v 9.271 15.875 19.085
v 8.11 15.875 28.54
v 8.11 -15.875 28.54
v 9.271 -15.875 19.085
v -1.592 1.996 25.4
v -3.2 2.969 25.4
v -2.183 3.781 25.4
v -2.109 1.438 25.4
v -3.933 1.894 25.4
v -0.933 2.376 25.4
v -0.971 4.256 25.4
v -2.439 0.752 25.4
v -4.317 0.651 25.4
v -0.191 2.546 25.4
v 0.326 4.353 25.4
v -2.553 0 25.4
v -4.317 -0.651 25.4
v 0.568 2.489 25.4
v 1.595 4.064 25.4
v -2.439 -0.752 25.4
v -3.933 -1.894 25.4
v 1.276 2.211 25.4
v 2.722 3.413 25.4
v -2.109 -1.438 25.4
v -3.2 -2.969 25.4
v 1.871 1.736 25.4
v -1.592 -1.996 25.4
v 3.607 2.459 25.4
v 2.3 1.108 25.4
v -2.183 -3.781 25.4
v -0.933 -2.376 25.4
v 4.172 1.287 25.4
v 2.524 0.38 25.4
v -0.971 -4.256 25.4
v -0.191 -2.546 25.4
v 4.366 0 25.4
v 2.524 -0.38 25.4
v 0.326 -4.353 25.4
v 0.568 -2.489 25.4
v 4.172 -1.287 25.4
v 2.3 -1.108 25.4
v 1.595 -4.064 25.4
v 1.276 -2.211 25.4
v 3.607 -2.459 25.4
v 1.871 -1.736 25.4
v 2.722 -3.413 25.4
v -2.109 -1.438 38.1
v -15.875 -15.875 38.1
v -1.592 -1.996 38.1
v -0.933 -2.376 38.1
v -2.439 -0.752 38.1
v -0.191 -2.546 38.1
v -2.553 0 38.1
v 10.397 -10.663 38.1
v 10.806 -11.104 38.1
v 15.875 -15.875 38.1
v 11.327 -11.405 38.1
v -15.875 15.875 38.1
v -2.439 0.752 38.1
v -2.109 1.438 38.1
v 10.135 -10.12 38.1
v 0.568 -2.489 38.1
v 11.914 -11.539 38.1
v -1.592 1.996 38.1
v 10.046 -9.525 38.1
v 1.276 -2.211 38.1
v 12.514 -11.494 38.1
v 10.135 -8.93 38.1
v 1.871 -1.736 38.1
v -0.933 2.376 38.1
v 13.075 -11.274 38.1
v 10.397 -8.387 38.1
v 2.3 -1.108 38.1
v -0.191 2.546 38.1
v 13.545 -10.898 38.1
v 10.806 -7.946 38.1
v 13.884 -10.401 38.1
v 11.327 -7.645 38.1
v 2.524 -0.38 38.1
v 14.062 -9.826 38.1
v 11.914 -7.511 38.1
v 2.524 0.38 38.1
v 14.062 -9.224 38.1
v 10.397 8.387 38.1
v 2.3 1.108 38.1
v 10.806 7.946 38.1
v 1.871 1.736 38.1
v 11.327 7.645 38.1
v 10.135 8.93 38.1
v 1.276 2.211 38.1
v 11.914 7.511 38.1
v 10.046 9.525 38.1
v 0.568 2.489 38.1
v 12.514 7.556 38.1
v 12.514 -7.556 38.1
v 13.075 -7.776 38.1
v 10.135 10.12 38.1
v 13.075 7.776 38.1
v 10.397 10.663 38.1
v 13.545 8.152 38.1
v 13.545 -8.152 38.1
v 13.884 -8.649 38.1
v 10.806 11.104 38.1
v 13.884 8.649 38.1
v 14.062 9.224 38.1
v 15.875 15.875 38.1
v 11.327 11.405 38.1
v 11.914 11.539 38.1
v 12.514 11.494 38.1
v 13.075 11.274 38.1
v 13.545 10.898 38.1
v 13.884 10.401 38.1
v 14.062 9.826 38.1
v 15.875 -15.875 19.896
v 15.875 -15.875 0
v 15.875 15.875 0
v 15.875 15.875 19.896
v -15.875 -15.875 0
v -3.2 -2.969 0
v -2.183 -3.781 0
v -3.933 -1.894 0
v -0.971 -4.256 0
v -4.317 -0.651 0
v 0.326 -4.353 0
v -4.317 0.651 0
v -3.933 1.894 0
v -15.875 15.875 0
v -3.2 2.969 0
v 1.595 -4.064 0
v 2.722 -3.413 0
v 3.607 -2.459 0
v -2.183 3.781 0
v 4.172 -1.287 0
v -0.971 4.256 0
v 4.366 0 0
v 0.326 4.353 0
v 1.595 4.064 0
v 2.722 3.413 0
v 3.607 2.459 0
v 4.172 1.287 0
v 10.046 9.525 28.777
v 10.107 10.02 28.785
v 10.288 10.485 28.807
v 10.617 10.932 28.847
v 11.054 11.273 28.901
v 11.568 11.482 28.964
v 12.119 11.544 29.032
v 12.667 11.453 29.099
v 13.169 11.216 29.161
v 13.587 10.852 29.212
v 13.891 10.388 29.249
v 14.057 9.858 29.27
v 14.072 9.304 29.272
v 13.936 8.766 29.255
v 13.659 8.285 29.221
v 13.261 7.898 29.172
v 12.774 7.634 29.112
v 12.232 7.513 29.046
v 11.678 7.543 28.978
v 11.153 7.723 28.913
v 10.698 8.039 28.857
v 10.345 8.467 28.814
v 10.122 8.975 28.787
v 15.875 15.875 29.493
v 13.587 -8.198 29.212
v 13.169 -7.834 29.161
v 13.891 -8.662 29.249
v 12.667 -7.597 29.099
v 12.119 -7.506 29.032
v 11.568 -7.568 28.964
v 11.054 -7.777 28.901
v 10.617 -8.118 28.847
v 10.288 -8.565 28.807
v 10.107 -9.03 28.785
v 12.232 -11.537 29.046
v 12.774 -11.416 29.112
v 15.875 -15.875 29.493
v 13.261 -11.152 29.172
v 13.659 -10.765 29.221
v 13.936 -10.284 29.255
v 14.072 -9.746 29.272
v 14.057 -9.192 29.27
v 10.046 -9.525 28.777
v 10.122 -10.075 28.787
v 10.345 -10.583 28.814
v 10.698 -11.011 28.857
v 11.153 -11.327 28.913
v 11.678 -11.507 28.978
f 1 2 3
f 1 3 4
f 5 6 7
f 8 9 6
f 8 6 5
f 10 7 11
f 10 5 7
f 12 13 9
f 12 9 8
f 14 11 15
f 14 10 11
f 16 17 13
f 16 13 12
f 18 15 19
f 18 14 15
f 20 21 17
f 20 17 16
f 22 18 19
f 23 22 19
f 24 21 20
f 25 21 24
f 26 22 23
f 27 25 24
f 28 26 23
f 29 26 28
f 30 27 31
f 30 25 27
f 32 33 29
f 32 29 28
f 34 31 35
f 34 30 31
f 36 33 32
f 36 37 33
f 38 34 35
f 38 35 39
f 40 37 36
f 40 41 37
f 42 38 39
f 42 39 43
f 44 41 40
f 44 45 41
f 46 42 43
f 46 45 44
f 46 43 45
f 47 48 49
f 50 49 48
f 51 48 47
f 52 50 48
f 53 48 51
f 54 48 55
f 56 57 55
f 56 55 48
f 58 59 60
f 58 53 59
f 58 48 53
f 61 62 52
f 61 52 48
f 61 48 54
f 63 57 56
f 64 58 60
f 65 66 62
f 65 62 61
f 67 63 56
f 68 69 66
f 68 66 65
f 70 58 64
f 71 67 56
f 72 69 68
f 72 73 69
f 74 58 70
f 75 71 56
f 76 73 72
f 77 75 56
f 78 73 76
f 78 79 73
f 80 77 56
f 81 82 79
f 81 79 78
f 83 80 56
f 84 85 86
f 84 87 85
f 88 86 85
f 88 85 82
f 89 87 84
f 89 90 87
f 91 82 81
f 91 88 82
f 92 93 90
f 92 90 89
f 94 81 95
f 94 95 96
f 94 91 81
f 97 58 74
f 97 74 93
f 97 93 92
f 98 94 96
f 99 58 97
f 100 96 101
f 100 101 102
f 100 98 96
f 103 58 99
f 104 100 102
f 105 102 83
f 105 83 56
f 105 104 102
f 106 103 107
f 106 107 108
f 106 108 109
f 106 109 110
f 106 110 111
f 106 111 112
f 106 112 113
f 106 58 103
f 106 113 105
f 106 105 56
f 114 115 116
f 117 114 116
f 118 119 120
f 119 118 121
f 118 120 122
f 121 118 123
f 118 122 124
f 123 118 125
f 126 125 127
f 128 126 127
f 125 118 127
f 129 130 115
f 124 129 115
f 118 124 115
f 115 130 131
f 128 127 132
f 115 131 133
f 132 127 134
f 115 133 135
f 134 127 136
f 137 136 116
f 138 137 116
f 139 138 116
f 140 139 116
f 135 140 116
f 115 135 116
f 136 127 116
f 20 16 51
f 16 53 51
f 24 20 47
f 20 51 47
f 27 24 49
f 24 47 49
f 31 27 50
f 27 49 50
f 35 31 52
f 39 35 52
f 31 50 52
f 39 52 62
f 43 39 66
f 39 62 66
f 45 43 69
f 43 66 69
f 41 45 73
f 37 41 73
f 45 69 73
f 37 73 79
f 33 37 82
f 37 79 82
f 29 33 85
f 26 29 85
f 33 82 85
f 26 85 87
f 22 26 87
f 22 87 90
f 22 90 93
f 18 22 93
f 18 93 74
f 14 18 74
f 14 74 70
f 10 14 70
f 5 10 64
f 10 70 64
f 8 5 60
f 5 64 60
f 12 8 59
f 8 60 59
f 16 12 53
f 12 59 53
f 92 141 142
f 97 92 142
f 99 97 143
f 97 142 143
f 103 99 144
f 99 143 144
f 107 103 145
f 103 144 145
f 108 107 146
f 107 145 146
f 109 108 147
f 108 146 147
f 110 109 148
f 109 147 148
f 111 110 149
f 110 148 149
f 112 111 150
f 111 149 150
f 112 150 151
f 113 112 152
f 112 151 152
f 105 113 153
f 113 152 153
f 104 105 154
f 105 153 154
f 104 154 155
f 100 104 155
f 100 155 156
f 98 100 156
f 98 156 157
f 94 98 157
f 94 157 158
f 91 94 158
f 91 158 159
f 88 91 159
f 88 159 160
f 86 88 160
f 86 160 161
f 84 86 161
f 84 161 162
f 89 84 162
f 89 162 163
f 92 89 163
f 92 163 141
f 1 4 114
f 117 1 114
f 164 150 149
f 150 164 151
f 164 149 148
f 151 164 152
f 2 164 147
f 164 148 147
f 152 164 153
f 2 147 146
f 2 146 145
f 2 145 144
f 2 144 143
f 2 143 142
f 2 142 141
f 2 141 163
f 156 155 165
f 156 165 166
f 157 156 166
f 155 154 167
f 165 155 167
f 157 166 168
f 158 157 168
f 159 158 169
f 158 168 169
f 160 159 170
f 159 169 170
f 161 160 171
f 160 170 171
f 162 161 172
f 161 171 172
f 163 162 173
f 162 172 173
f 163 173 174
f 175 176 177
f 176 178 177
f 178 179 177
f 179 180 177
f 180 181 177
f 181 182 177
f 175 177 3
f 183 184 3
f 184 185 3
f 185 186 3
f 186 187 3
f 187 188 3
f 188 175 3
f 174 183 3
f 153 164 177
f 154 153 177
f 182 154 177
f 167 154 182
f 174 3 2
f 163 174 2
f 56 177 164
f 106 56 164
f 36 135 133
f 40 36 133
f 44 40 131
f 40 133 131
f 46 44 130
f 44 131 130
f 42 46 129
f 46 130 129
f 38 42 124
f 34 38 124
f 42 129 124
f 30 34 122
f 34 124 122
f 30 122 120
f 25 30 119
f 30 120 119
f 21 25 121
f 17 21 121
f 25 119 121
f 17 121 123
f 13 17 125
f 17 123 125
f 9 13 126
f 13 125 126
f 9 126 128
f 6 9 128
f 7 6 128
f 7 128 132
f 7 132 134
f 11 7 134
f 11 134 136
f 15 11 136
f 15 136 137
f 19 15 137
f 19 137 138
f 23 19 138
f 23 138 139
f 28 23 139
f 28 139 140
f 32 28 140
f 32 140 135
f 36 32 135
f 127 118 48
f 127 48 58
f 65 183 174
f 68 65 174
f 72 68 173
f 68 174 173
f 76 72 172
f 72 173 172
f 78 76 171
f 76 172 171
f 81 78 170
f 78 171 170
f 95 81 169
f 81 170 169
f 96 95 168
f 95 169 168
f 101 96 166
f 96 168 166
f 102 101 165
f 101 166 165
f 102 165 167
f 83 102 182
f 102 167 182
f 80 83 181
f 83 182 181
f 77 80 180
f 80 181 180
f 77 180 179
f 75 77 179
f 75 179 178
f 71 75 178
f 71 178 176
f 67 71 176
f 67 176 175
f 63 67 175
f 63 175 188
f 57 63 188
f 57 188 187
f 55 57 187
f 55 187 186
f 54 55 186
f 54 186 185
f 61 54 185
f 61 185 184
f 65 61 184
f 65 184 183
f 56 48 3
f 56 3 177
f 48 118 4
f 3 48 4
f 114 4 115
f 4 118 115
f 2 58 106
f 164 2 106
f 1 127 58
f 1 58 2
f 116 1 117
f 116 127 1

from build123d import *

# Parameters (mm, degrees)
F0_W           = 31.75
F0_H           = 31.75
F1_DEPTH       = 38.1
F3_D           = 5.1054
F3_CBORE_D     = 8.73125
F3_CBORE_DEPTH = 25.4
F5_DEPTH       = 31.751
F7_D           = 4.0386
F7_DEPTH       = 9.49325
F7_TIP         = 1.213317848


with BuildPart() as f1:
    # F0 (on Top) → F1 (new body)
    with BuildSketch(Plane.XY):
        Rectangle(F0_W, F0_H)
    extrude(amount=F1_DEPTH)

    # F3 (through all)
    with Locations(Plane(origin=(0, 0, 0), x_dir=(1, 0, 0), z_dir=(0, 0, -1))):
        with Locations((0, 0)):
            CounterBoreHole(F3_D / 2, F3_CBORE_D / 2, F3_CBORE_DEPTH)

    # F4 (on face) → F5 (cut, through all)
    with BuildSketch(Plane.XZ.offset(15.875)):
        Polygon((34.4816722517, 22.1809802753), (33.3208667558, 31.6349823697), (8.1101945041, 28.5395010472), (9.271, 19.0854989528), align=None)
    extrude(amount=-F5_DEPTH, mode=Mode.SUBTRACT)

    # F7
    with Locations(Plane.XY.offset(38.1)):
        with Locations((12.065, -9.525), (12.065, 9.525)):
            Hole(F7_D / 2, depth=F7_DEPTH)
            with Locations((0, 0, -(F7_DEPTH + F7_TIP / 2))):  # 118° drill point
                Cone(0, F7_D / 2, F7_TIP, mode=Mode.SUBTRACT)


solid = f1.part
